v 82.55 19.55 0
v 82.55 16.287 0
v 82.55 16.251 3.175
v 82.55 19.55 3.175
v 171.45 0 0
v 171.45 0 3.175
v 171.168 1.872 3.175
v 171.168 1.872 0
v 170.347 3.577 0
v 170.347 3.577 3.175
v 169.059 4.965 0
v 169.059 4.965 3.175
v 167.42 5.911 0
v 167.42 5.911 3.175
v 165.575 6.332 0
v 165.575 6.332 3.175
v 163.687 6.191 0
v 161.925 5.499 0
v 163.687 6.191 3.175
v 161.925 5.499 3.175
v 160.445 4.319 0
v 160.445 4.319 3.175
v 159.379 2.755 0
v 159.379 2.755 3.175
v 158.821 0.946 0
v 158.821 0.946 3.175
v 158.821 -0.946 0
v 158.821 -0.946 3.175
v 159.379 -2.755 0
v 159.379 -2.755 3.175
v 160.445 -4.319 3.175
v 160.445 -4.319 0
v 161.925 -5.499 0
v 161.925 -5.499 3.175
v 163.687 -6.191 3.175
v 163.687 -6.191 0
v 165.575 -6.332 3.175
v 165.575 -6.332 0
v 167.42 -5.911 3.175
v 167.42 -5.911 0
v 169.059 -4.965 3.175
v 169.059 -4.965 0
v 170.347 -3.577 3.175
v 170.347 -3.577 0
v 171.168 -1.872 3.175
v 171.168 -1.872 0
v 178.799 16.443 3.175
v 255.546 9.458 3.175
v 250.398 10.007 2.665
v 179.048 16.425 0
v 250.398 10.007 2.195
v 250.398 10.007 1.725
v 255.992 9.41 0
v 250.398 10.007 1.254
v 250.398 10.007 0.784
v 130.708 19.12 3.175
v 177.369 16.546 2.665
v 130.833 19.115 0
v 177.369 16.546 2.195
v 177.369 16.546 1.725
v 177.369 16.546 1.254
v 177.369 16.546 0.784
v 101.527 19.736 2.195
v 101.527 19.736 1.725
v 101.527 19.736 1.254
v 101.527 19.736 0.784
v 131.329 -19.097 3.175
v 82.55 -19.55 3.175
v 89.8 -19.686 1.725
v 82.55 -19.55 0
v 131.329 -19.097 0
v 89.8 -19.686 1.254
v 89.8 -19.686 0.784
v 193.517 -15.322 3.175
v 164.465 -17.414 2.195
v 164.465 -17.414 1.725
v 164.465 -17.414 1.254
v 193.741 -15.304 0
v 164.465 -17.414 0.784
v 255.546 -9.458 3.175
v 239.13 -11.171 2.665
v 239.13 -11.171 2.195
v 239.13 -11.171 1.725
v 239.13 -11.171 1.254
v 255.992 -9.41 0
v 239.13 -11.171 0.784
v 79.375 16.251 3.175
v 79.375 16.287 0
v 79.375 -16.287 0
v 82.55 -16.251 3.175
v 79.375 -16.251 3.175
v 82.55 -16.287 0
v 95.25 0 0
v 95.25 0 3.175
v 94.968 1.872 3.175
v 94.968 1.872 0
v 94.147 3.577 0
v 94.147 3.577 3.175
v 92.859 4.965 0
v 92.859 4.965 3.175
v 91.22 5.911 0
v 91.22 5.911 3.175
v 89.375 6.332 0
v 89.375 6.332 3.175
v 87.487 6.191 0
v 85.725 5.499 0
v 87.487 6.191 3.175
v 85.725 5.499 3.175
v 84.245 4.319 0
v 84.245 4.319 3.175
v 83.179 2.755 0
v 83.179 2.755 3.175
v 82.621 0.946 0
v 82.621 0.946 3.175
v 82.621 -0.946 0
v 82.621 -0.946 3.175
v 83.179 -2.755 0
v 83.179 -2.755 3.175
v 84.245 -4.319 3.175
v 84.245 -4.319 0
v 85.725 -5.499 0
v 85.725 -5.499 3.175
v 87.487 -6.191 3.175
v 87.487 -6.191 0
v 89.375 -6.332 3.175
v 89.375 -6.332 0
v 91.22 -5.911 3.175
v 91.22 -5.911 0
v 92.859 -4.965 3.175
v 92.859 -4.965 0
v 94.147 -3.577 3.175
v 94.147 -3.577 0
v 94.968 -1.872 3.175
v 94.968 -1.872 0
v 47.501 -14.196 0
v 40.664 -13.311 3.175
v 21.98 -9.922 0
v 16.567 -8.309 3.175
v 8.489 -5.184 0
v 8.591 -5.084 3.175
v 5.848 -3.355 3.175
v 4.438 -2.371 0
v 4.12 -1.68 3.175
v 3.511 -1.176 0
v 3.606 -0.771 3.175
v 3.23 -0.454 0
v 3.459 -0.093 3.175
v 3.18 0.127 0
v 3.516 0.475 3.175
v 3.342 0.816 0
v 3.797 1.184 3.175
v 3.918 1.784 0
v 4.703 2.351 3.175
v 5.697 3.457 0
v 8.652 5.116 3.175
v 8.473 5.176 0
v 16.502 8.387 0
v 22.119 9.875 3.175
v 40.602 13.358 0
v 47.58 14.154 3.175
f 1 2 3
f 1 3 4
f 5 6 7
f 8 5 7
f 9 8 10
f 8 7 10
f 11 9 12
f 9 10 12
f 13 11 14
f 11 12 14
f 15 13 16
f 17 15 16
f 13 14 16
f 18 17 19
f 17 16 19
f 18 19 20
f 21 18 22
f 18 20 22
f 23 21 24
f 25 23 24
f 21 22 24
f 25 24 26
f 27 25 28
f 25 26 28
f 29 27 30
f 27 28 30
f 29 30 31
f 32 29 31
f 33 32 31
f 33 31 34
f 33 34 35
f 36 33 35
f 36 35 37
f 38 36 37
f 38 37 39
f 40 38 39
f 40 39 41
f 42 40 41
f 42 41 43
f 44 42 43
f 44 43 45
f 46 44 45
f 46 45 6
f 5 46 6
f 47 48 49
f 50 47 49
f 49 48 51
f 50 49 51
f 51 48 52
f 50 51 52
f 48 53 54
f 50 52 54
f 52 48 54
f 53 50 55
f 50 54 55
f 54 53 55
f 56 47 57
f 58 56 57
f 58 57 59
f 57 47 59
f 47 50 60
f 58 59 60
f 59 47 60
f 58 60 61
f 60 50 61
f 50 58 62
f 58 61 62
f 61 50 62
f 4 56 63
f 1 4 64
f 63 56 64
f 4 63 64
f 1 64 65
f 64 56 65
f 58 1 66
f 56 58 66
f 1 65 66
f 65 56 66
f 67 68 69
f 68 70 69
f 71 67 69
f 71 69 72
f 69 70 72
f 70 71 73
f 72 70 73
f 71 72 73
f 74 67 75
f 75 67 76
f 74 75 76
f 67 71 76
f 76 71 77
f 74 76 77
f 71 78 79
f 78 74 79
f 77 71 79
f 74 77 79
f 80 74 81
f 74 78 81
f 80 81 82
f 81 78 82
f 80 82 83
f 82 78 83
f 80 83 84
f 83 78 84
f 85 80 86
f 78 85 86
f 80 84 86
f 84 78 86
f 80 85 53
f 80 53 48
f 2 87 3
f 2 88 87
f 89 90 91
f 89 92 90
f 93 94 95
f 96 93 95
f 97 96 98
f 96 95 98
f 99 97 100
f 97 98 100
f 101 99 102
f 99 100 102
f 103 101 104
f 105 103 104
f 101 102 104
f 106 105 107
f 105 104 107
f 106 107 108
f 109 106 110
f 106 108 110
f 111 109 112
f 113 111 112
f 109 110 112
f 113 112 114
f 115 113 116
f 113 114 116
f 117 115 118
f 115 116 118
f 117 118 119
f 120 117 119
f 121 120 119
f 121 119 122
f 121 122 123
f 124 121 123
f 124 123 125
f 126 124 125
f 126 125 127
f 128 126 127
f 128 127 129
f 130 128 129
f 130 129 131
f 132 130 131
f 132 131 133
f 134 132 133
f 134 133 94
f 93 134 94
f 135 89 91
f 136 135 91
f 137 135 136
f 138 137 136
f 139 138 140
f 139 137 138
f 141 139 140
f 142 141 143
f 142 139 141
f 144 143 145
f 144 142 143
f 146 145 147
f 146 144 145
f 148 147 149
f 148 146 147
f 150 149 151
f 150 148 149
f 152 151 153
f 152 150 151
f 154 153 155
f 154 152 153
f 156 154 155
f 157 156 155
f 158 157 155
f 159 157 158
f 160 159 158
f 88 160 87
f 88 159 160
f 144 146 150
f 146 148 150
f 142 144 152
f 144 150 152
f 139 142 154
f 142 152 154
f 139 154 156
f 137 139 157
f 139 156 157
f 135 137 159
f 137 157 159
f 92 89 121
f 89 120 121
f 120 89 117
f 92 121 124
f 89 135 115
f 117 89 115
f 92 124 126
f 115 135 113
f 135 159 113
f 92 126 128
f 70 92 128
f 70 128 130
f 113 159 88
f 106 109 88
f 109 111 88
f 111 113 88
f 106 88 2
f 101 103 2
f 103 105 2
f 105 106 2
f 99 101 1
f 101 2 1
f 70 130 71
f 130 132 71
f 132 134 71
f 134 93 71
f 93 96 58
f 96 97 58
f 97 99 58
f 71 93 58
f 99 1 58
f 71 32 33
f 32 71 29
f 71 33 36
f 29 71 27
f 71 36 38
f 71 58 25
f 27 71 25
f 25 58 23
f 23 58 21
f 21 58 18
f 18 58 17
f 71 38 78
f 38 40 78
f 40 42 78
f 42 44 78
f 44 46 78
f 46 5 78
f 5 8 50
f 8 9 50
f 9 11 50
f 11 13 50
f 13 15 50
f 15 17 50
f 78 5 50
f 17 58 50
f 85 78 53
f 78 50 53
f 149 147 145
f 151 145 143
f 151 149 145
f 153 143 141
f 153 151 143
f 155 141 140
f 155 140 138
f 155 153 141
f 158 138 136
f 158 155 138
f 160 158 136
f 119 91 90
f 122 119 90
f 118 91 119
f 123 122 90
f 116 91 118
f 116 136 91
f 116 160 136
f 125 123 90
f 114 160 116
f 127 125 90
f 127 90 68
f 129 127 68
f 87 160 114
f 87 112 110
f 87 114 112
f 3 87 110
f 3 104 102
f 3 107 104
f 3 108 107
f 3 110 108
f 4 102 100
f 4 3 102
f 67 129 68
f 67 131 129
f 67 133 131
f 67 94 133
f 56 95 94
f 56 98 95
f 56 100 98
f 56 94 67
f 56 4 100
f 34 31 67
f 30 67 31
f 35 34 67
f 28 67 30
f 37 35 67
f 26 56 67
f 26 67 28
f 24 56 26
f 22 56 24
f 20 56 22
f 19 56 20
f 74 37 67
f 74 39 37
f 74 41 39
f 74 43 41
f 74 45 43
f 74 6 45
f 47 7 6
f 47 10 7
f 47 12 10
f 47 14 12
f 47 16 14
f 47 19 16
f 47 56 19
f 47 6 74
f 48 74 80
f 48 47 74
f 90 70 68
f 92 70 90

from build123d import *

# Parameters (mm, degrees)
BOSS_EXTRUDE1_DEPTH     = 3.175
SKETCH2_R               = 6.35
CUT_EXTRUDE1_DEPTH      = 4.1750001
CUT_EXTRUDE2_DEPTH      = 20.741500936
CUT_EXTRUDE2_DEPTH_BACK = 20.741500936


with BuildPart() as part:
    # Sketch1 → Boss-Extrude1 (new body)
    with BuildSketch(Plane.XY):
        with BuildLine():
            add(Edge.make_bspline(
                [(328.93, 0.4144518), (328.807900642, 0.516772717), (328.019000541, 0.420161926), (326.614170865, 0.815622818), (324.037900124, 1.060053788), (320.567272172, 1.584632638), (316.096583479, 2.170027594), (310.705215164, 2.891499965), (304.407193949, 3.70705594), (297.248126622, 4.61507178), (289.269853683, 5.599640546), (280.522284399, 6.647437516), (271.05918713, 7.745466949), (260.938835986, 8.878779448), (250.223661724, 10.033538187), (238.979802735, 11.195400912), (227.276553794, 12.349370833), (215.186101231, 13.479249677), (202.78290329, 14.570204468), (190.143565404, 15.603996393), (177.345750776, 16.563769435), (164.468478458, 17.43170464), (151.591090461, 18.189654233), (138.792862913, 18.818469572), (126.15283726, 19.301382712), (113.748578816, 19.622639213), (101.656743367, 19.766547691), (89.951630239, 19.721687508), (78.705404506, 19.479393557), (67.987291822, 19.033523951), (57.863264224, 18.382912366), (48.395544354, 17.529516447), (39.642067919, 16.480001255), (31.656190162, 15.24329661), (24.486303571, 13.832318834), (18.174431838, 12.263022231), (12.756441756, 10.550709399), (8.259860269, 8.711328155), (4.699027102, 6.757322776), (2.079421527, 4.684836659), (0.401585469, 2.443731656), (-0.187153107, 0), (0.401585469, -2.443731656), (2.079421527, -4.684836659), (4.699027102, -6.757322776), (8.259860269, -8.711328155), (12.756441756, -10.550709399), (18.174431838, -12.263022231), (24.486303571, -13.832318834), (31.656190162, -15.24329661), (39.642067919, -16.480001255), (48.395544354, -17.529516447), (57.863264224, -18.382912366), (67.987291822, -19.033523951), (78.705404506, -19.479393557), (89.951630239, -19.721687508), (101.656743367, -19.766547691), (113.748578816, -19.622639213), (126.15283726, -19.301382712), (138.792862913, -18.818469572), (151.591090461, -18.189654233), (164.468478458, -17.43170464), (177.345750776, -16.563769435), (190.143565404, -15.603996393), (202.78290329, -14.570204468), (215.186101231, -13.479249677), (227.276553794, -12.349370833), (238.979802735, -11.195400912), (250.223661724, -10.033538187), (260.938835986, -8.878779448), (271.05918713, -7.745466949), (280.522284399, -6.647437516), (289.269853683, -5.599640546), (297.248126622, -4.61507178), (304.407193949, -3.70705594), (310.705215164, -2.891499965), (316.096583479, -2.170027594), (320.567272172, -1.584632638), (324.037900124, -1.060053788), (326.614170865, -0.815622818), (328.019000541, -0.420161926), (329.127736254, -0.555940631), (329.127736254, 0.24874614), (328.93, 0.4144518)],
                knots=[0, 0, 0, 0, 0.000762215, 0.003044706, 0.006832246, 0.012101176, 0.018817536, 0.026939455, 0.036414848, 0.047184629, 0.059180413, 0.072327874, 0.086544061, 0.10174058, 0.117823336, 0.134691452, 0.152240154, 0.17036129, 0.188941008, 0.207865435, 0.227016078, 0.246275696, 0.265524943, 0.284644966, 0.303520118, 0.322034575, 0.340078353, 0.357542593, 0.374325482, 0.390329891, 0.40546389, 0.419643801, 0.432793371, 0.444843817, 0.455737921, 0.465428653, 0.47388632, 0.481101634, 0.487101684, 0.491975368, 0.495930678, 0.499382808, 0.502834938, 0.506790248, 0.511663932, 0.517663982, 0.524879296, 0.533336963, 0.543027695, 0.553921799, 0.565972245, 0.579121815, 0.593301726, 0.608435725, 0.624440134, 0.641223023, 0.658687263, 0.676731041, 0.695245498, 0.71412065, 0.733240673, 0.75248992, 0.771749538, 0.790900181, 0.809824608, 0.828404326, 0.846525462, 0.864074164, 0.88094228, 0.897025036, 0.912221555, 0.926437743, 0.939585203, 0.951580988, 0.962350768, 0.971826161, 0.979948081, 0.98666444, 0.991933371, 0.99572091, 0.998003402, 0.998765616, 1, 1, 1, 1], degree=3))
        make_face()
    extrude(amount=BOSS_EXTRUDE1_DEPTH)

    # Sketch2 → Cut-Extrude1 (cut, through all)
    with BuildSketch(Plane.XY.offset(3.175)):
        with Locations((88.9, 0)):
            Circle(SKETCH2_R)
        with Locations((165.1, 0)):
            Circle(SKETCH2_R)
    extrude(amount=-CUT_EXTRUDE1_DEPTH, mode=Mode.SUBTRACT)

    # Sketch3 → Cut-Extrude2 (cut, two sides)
    with BuildSketch(Plane(origin=(0, 0, 0), x_dir=(1, 0, 0), z_dir=(0, 1, 0))) as cut_extrude2_sk:
        Polygon((255.992242673, 0), (255.545593987, -3.175), (329.07830219, -3.175), (329.07830219, 0), align=None)
    extrude(amount=CUT_EXTRUDE2_DEPTH, mode=Mode.SUBTRACT)
    extrude(cut_extrude2_sk.sketch, amount=-CUT_EXTRUDE2_DEPTH_BACK, mode=Mode.SUBTRACT)

    # Sketch4 → Cut-Loft1 section 0
    with BuildSketch(Plane.XY.offset(3.175)):
        with BuildLine():
            Line((82.55, -19.515708197), (82.55, -16.251023077))
            Line((82.55, -16.251023077), (79.375, -16.251023077))
            add(Edge.make_bspline(
                [(79.375, 16.251023077), (72.770318552, 16.048049675), (66.176202719, 15.728304371), (56.30738853, 15.001567412), (53.021532705, 14.717888762), (46.459157571, 14.04734399), (43.182596705, 13.660937457), (38.276882967, 12.980450934), (36.643177419, 12.736779299), (33.379494145, 12.209172355), (31.748117674, 11.925180268), (28.498717967, 11.31067673), (26.880571377, 10.97988905), (23.660292552, 10.260780921), (22.058116365, 9.87261787), (18.875212279, 9.019251619), (17.293996052, 8.555526619), (14.162834442, 7.517257926), (12.611952901, 6.946125273), (10.325000489, 5.950076454), (9.567811499, 5.594025093), (8.461932827, 5.017489815), (8.097932617, 4.81777412), (7.381669561, 4.39922172), (7.029407018, 4.180395983), (6.339282138, 3.719594292), (6.001169966, 3.47795005), (5.346762375, 2.959692647), (5.02857237, 2.681117584), (4.439349211, 2.084395549), (4.164695388, 1.768387828), (3.820228536, 1.236176286), (3.718740433, 1.050561172), (3.59999989, 0.759299745), (3.565442077, 0.659141625), (3.509216677, 0.455376556), (3.487522742, 0.351764773), (3.459675736, 0.143592536), (3.453573255, 0.038940089), (3.461444597, -0.171798071), (3.474973766, -0.278422694), (3.536160139, -0.588423887), (3.603651886, -0.78636311), (3.780189655, -1.168677669), (3.889538593, -1.351988295), (4.129382817, -1.699026003), (4.261329389, -1.864987348), (4.67775825, -2.342961513), (4.979594961, -2.63427888), (5.614334641, -3.181856059), (5.947755344, -3.437548737), (6.980186178, -4.167859174), (7.695486627, -4.59881642), (9.156342741, -5.391257516), (9.902423269, -5.75319572), (11.414841066, -6.432708068), (12.181579116, -6.749404985), (13.73156777, -7.346635451), (14.514836956, -7.627179806), (16.093189665, -8.161972373), (16.88860874, -8.415184993), (18.482918694, -8.896317804), (19.282763312, -9.124717403), (21.688920309, -9.779957105), (23.302005405, -10.176164111), (26.541461257, -10.908476052), (28.167798474, -11.244732377), (33.062961618, -12.180447863), (36.350545365, -12.709560737), (42.938422768, -13.630876096), (46.23811967, -14.02274496), (52.84624923, -14.702163706), (56.154743063, -14.989298509), (66.090451195, -15.724271447), (72.727906329, -16.046777883), (79.375, -16.251023077)],
                knots=[0, 0, 0, 0, 0.125, 0.125, 0.1875, 0.1875, 0.25, 0.25, 0.28125, 0.28125, 0.3125, 0.3125, 0.34375, 0.34375, 0.375, 0.375, 0.40625, 0.40625, 0.4375, 0.4375, 0.453125, 0.453125, 0.4609375, 0.4609375, 0.46875, 0.46875, 0.4765625, 0.4765625, 0.484375, 0.484375, 0.4921875, 0.4921875, 0.49609375, 0.49609375, 0.498046875, 0.498046875, 0.5, 0.5, 0.501953125, 0.501953125, 0.50390625, 0.50390625, 0.5078125, 0.5078125, 0.51171875, 0.51171875, 0.515625, 0.515625, 0.5234375, 0.5234375, 0.53125, 0.53125, 0.546875, 0.546875, 0.5625, 0.5625, 0.578125, 0.578125, 0.59375, 0.59375, 0.609375, 0.609375, 0.625, 0.625, 0.65625, 0.65625, 0.6875, 0.6875, 0.75, 0.75, 0.8125, 0.8125, 0.875, 0.875, 1, 1, 1, 1], degree=3))
            Line((79.375, 16.251023077), (82.55, 16.251023077))
            Line((82.55, 16.251023077), (82.55, 19.515708197))
            Line((82.55, 19.515708197), (82.55, 26.856724286))
            Line((82.55, 26.856724286), (0.541465363, 30.021162049))
            Line((0.541465363, 30.021162049), (-2.146488993, -32.850745924))
            Line((-2.146488993, -32.850745924), (82.55, -25.525605715))
            Line((82.55, -25.525605715), (82.55, -19.515708197))
        make_face()
    # Sketch5 → Cut-Loft1 section 1
    with BuildSketch(Plane(origin=(0, 0, 0), x_dir=(-1, 0, 0), z_dir=(0, 0, -1))):
        with BuildLine():
            Line((-82.55, 16.286875084), (-82.55, 19.550482394))
            Line((-82.55, 19.550482394), (-82.55, 31.358919225))
            Line((-82.55, 31.358919225), (6.781155494, 29.861379368))
            Line((6.781155494, 29.861379368), (6.781155494, -36.639095207))
            Line((6.781155494, -36.639095207), (-82.55, -25.525605715))
            Line((-82.55, -25.525605715), (-82.55, -19.550482394))
            Line((-82.55, -19.550482394), (-82.55, -16.286875084))
            Line((-82.55, -16.286875084), (-79.375, -16.286825084))
            add(Edge.make_bspline(
                [(-79.375, -16.286825084), (-72.70273318, -16.083625481), (-66.040162391, -15.761734789), (-56.066904089, -15.02675589), (-52.74593973, -14.739468648), (-46.112636154, -14.059312037), (-42.800262288, -13.666866819), (-36.186801437, -12.743811384), (-32.886327655, -12.2135267), (-27.972128974, -11.275498707), (-26.339484745, -10.938349054), (-23.087489601, -10.204046758), (-21.46817298, -9.806739324), (-19.052762163, -9.149552861), (-18.249847199, -8.920461216), (-16.649429662, -8.437847637), (-15.850951917, -8.18383552), (-13.474510425, -7.379098548), (-11.914239449, -6.789912299), (-9.637231735, -5.767068515), (-8.888396164, -5.403819393), (-7.422171814, -4.608342986), (-6.704241471, -4.175660987), (-5.668127182, -3.442181611), (-5.333636046, -3.185395684), (-4.696951467, -2.635333166), (-4.394240594, -2.342641179), (-3.976788262, -1.862235899), (-3.844582818, -1.695403026), (-3.604511152, -1.346529706), (-3.495161032, -1.162204789), (-3.319211947, -0.777827241), (-3.252263911, -0.578820545), (-3.192281327, -0.267197855), (-3.179223041, -0.160018081), (-3.172509862, 0.051695952), (-3.179309615, 0.15678123), (-3.223308922, 0.470243795), (-3.283913969, 0.67718865), (-3.444877784, 1.066367796), (-3.547583565, 1.252275918), (-3.89542395, 1.785311832), (-4.171725698, 2.101726419), (-4.764220619, 2.699573748), (-5.08404298, 2.978749304), (-5.741470891, 3.497921226), (-6.081013127, 3.739966717), (-7.120428348, 4.432428384), (-7.84199373, 4.847705574), (-9.322334636, 5.617984146), (-10.082577048, 5.974865708), (-12.378451328, 6.97306267), (-13.935068025, 7.545295509), (-17.077417964, 8.585489689), (-18.664115765, 9.049996772), (-21.858212178, 9.904877668), (-23.466047551, 10.293687362), (-26.697720209, 11.014001073), (-28.321602434, 11.345344154), (-31.582558999, 11.960787009), (-33.219741649, 12.245183343), (-36.494895711, 12.773474887), (-38.134297303, 13.017428152), (-43.057081916, 13.69860264), (-46.345031773, 14.085282453), (-52.93019877, 14.756080578), (-56.227457948, 15.039733656), (-66.130500011, 15.766027755), (-72.74745852, 16.084987562), (-79.375, 16.286825084)],
                knots=[0, 0, 0, 0, 0.125, 0.125, 0.1875, 0.1875, 0.25, 0.25, 0.3125, 0.3125, 0.34375, 0.34375, 0.375, 0.375, 0.390625, 0.390625, 0.40625, 0.40625, 0.4375, 0.4375, 0.453125, 0.453125, 0.46875, 0.46875, 0.4765625, 0.4765625, 0.484375, 0.484375, 0.48828125, 0.48828125, 0.4921875, 0.4921875, 0.49609375, 0.49609375, 0.498046875, 0.498046875, 0.5, 0.5, 0.50390625, 0.50390625, 0.5078125, 0.5078125, 0.515625, 0.515625, 0.5234375, 0.5234375, 0.53125, 0.53125, 0.546875, 0.546875, 0.5625, 0.5625, 0.59375, 0.59375, 0.625, 0.625, 0.65625, 0.65625, 0.6875, 0.6875, 0.71875, 0.71875, 0.75, 0.75, 0.8125, 0.8125, 0.875, 0.875, 1, 1, 1, 1], degree=3))
            Line((-79.375, 16.286825084), (-82.55, 16.286875084))
        make_face()
    loft(mode=Mode.SUBTRACT)


solid = part.part
